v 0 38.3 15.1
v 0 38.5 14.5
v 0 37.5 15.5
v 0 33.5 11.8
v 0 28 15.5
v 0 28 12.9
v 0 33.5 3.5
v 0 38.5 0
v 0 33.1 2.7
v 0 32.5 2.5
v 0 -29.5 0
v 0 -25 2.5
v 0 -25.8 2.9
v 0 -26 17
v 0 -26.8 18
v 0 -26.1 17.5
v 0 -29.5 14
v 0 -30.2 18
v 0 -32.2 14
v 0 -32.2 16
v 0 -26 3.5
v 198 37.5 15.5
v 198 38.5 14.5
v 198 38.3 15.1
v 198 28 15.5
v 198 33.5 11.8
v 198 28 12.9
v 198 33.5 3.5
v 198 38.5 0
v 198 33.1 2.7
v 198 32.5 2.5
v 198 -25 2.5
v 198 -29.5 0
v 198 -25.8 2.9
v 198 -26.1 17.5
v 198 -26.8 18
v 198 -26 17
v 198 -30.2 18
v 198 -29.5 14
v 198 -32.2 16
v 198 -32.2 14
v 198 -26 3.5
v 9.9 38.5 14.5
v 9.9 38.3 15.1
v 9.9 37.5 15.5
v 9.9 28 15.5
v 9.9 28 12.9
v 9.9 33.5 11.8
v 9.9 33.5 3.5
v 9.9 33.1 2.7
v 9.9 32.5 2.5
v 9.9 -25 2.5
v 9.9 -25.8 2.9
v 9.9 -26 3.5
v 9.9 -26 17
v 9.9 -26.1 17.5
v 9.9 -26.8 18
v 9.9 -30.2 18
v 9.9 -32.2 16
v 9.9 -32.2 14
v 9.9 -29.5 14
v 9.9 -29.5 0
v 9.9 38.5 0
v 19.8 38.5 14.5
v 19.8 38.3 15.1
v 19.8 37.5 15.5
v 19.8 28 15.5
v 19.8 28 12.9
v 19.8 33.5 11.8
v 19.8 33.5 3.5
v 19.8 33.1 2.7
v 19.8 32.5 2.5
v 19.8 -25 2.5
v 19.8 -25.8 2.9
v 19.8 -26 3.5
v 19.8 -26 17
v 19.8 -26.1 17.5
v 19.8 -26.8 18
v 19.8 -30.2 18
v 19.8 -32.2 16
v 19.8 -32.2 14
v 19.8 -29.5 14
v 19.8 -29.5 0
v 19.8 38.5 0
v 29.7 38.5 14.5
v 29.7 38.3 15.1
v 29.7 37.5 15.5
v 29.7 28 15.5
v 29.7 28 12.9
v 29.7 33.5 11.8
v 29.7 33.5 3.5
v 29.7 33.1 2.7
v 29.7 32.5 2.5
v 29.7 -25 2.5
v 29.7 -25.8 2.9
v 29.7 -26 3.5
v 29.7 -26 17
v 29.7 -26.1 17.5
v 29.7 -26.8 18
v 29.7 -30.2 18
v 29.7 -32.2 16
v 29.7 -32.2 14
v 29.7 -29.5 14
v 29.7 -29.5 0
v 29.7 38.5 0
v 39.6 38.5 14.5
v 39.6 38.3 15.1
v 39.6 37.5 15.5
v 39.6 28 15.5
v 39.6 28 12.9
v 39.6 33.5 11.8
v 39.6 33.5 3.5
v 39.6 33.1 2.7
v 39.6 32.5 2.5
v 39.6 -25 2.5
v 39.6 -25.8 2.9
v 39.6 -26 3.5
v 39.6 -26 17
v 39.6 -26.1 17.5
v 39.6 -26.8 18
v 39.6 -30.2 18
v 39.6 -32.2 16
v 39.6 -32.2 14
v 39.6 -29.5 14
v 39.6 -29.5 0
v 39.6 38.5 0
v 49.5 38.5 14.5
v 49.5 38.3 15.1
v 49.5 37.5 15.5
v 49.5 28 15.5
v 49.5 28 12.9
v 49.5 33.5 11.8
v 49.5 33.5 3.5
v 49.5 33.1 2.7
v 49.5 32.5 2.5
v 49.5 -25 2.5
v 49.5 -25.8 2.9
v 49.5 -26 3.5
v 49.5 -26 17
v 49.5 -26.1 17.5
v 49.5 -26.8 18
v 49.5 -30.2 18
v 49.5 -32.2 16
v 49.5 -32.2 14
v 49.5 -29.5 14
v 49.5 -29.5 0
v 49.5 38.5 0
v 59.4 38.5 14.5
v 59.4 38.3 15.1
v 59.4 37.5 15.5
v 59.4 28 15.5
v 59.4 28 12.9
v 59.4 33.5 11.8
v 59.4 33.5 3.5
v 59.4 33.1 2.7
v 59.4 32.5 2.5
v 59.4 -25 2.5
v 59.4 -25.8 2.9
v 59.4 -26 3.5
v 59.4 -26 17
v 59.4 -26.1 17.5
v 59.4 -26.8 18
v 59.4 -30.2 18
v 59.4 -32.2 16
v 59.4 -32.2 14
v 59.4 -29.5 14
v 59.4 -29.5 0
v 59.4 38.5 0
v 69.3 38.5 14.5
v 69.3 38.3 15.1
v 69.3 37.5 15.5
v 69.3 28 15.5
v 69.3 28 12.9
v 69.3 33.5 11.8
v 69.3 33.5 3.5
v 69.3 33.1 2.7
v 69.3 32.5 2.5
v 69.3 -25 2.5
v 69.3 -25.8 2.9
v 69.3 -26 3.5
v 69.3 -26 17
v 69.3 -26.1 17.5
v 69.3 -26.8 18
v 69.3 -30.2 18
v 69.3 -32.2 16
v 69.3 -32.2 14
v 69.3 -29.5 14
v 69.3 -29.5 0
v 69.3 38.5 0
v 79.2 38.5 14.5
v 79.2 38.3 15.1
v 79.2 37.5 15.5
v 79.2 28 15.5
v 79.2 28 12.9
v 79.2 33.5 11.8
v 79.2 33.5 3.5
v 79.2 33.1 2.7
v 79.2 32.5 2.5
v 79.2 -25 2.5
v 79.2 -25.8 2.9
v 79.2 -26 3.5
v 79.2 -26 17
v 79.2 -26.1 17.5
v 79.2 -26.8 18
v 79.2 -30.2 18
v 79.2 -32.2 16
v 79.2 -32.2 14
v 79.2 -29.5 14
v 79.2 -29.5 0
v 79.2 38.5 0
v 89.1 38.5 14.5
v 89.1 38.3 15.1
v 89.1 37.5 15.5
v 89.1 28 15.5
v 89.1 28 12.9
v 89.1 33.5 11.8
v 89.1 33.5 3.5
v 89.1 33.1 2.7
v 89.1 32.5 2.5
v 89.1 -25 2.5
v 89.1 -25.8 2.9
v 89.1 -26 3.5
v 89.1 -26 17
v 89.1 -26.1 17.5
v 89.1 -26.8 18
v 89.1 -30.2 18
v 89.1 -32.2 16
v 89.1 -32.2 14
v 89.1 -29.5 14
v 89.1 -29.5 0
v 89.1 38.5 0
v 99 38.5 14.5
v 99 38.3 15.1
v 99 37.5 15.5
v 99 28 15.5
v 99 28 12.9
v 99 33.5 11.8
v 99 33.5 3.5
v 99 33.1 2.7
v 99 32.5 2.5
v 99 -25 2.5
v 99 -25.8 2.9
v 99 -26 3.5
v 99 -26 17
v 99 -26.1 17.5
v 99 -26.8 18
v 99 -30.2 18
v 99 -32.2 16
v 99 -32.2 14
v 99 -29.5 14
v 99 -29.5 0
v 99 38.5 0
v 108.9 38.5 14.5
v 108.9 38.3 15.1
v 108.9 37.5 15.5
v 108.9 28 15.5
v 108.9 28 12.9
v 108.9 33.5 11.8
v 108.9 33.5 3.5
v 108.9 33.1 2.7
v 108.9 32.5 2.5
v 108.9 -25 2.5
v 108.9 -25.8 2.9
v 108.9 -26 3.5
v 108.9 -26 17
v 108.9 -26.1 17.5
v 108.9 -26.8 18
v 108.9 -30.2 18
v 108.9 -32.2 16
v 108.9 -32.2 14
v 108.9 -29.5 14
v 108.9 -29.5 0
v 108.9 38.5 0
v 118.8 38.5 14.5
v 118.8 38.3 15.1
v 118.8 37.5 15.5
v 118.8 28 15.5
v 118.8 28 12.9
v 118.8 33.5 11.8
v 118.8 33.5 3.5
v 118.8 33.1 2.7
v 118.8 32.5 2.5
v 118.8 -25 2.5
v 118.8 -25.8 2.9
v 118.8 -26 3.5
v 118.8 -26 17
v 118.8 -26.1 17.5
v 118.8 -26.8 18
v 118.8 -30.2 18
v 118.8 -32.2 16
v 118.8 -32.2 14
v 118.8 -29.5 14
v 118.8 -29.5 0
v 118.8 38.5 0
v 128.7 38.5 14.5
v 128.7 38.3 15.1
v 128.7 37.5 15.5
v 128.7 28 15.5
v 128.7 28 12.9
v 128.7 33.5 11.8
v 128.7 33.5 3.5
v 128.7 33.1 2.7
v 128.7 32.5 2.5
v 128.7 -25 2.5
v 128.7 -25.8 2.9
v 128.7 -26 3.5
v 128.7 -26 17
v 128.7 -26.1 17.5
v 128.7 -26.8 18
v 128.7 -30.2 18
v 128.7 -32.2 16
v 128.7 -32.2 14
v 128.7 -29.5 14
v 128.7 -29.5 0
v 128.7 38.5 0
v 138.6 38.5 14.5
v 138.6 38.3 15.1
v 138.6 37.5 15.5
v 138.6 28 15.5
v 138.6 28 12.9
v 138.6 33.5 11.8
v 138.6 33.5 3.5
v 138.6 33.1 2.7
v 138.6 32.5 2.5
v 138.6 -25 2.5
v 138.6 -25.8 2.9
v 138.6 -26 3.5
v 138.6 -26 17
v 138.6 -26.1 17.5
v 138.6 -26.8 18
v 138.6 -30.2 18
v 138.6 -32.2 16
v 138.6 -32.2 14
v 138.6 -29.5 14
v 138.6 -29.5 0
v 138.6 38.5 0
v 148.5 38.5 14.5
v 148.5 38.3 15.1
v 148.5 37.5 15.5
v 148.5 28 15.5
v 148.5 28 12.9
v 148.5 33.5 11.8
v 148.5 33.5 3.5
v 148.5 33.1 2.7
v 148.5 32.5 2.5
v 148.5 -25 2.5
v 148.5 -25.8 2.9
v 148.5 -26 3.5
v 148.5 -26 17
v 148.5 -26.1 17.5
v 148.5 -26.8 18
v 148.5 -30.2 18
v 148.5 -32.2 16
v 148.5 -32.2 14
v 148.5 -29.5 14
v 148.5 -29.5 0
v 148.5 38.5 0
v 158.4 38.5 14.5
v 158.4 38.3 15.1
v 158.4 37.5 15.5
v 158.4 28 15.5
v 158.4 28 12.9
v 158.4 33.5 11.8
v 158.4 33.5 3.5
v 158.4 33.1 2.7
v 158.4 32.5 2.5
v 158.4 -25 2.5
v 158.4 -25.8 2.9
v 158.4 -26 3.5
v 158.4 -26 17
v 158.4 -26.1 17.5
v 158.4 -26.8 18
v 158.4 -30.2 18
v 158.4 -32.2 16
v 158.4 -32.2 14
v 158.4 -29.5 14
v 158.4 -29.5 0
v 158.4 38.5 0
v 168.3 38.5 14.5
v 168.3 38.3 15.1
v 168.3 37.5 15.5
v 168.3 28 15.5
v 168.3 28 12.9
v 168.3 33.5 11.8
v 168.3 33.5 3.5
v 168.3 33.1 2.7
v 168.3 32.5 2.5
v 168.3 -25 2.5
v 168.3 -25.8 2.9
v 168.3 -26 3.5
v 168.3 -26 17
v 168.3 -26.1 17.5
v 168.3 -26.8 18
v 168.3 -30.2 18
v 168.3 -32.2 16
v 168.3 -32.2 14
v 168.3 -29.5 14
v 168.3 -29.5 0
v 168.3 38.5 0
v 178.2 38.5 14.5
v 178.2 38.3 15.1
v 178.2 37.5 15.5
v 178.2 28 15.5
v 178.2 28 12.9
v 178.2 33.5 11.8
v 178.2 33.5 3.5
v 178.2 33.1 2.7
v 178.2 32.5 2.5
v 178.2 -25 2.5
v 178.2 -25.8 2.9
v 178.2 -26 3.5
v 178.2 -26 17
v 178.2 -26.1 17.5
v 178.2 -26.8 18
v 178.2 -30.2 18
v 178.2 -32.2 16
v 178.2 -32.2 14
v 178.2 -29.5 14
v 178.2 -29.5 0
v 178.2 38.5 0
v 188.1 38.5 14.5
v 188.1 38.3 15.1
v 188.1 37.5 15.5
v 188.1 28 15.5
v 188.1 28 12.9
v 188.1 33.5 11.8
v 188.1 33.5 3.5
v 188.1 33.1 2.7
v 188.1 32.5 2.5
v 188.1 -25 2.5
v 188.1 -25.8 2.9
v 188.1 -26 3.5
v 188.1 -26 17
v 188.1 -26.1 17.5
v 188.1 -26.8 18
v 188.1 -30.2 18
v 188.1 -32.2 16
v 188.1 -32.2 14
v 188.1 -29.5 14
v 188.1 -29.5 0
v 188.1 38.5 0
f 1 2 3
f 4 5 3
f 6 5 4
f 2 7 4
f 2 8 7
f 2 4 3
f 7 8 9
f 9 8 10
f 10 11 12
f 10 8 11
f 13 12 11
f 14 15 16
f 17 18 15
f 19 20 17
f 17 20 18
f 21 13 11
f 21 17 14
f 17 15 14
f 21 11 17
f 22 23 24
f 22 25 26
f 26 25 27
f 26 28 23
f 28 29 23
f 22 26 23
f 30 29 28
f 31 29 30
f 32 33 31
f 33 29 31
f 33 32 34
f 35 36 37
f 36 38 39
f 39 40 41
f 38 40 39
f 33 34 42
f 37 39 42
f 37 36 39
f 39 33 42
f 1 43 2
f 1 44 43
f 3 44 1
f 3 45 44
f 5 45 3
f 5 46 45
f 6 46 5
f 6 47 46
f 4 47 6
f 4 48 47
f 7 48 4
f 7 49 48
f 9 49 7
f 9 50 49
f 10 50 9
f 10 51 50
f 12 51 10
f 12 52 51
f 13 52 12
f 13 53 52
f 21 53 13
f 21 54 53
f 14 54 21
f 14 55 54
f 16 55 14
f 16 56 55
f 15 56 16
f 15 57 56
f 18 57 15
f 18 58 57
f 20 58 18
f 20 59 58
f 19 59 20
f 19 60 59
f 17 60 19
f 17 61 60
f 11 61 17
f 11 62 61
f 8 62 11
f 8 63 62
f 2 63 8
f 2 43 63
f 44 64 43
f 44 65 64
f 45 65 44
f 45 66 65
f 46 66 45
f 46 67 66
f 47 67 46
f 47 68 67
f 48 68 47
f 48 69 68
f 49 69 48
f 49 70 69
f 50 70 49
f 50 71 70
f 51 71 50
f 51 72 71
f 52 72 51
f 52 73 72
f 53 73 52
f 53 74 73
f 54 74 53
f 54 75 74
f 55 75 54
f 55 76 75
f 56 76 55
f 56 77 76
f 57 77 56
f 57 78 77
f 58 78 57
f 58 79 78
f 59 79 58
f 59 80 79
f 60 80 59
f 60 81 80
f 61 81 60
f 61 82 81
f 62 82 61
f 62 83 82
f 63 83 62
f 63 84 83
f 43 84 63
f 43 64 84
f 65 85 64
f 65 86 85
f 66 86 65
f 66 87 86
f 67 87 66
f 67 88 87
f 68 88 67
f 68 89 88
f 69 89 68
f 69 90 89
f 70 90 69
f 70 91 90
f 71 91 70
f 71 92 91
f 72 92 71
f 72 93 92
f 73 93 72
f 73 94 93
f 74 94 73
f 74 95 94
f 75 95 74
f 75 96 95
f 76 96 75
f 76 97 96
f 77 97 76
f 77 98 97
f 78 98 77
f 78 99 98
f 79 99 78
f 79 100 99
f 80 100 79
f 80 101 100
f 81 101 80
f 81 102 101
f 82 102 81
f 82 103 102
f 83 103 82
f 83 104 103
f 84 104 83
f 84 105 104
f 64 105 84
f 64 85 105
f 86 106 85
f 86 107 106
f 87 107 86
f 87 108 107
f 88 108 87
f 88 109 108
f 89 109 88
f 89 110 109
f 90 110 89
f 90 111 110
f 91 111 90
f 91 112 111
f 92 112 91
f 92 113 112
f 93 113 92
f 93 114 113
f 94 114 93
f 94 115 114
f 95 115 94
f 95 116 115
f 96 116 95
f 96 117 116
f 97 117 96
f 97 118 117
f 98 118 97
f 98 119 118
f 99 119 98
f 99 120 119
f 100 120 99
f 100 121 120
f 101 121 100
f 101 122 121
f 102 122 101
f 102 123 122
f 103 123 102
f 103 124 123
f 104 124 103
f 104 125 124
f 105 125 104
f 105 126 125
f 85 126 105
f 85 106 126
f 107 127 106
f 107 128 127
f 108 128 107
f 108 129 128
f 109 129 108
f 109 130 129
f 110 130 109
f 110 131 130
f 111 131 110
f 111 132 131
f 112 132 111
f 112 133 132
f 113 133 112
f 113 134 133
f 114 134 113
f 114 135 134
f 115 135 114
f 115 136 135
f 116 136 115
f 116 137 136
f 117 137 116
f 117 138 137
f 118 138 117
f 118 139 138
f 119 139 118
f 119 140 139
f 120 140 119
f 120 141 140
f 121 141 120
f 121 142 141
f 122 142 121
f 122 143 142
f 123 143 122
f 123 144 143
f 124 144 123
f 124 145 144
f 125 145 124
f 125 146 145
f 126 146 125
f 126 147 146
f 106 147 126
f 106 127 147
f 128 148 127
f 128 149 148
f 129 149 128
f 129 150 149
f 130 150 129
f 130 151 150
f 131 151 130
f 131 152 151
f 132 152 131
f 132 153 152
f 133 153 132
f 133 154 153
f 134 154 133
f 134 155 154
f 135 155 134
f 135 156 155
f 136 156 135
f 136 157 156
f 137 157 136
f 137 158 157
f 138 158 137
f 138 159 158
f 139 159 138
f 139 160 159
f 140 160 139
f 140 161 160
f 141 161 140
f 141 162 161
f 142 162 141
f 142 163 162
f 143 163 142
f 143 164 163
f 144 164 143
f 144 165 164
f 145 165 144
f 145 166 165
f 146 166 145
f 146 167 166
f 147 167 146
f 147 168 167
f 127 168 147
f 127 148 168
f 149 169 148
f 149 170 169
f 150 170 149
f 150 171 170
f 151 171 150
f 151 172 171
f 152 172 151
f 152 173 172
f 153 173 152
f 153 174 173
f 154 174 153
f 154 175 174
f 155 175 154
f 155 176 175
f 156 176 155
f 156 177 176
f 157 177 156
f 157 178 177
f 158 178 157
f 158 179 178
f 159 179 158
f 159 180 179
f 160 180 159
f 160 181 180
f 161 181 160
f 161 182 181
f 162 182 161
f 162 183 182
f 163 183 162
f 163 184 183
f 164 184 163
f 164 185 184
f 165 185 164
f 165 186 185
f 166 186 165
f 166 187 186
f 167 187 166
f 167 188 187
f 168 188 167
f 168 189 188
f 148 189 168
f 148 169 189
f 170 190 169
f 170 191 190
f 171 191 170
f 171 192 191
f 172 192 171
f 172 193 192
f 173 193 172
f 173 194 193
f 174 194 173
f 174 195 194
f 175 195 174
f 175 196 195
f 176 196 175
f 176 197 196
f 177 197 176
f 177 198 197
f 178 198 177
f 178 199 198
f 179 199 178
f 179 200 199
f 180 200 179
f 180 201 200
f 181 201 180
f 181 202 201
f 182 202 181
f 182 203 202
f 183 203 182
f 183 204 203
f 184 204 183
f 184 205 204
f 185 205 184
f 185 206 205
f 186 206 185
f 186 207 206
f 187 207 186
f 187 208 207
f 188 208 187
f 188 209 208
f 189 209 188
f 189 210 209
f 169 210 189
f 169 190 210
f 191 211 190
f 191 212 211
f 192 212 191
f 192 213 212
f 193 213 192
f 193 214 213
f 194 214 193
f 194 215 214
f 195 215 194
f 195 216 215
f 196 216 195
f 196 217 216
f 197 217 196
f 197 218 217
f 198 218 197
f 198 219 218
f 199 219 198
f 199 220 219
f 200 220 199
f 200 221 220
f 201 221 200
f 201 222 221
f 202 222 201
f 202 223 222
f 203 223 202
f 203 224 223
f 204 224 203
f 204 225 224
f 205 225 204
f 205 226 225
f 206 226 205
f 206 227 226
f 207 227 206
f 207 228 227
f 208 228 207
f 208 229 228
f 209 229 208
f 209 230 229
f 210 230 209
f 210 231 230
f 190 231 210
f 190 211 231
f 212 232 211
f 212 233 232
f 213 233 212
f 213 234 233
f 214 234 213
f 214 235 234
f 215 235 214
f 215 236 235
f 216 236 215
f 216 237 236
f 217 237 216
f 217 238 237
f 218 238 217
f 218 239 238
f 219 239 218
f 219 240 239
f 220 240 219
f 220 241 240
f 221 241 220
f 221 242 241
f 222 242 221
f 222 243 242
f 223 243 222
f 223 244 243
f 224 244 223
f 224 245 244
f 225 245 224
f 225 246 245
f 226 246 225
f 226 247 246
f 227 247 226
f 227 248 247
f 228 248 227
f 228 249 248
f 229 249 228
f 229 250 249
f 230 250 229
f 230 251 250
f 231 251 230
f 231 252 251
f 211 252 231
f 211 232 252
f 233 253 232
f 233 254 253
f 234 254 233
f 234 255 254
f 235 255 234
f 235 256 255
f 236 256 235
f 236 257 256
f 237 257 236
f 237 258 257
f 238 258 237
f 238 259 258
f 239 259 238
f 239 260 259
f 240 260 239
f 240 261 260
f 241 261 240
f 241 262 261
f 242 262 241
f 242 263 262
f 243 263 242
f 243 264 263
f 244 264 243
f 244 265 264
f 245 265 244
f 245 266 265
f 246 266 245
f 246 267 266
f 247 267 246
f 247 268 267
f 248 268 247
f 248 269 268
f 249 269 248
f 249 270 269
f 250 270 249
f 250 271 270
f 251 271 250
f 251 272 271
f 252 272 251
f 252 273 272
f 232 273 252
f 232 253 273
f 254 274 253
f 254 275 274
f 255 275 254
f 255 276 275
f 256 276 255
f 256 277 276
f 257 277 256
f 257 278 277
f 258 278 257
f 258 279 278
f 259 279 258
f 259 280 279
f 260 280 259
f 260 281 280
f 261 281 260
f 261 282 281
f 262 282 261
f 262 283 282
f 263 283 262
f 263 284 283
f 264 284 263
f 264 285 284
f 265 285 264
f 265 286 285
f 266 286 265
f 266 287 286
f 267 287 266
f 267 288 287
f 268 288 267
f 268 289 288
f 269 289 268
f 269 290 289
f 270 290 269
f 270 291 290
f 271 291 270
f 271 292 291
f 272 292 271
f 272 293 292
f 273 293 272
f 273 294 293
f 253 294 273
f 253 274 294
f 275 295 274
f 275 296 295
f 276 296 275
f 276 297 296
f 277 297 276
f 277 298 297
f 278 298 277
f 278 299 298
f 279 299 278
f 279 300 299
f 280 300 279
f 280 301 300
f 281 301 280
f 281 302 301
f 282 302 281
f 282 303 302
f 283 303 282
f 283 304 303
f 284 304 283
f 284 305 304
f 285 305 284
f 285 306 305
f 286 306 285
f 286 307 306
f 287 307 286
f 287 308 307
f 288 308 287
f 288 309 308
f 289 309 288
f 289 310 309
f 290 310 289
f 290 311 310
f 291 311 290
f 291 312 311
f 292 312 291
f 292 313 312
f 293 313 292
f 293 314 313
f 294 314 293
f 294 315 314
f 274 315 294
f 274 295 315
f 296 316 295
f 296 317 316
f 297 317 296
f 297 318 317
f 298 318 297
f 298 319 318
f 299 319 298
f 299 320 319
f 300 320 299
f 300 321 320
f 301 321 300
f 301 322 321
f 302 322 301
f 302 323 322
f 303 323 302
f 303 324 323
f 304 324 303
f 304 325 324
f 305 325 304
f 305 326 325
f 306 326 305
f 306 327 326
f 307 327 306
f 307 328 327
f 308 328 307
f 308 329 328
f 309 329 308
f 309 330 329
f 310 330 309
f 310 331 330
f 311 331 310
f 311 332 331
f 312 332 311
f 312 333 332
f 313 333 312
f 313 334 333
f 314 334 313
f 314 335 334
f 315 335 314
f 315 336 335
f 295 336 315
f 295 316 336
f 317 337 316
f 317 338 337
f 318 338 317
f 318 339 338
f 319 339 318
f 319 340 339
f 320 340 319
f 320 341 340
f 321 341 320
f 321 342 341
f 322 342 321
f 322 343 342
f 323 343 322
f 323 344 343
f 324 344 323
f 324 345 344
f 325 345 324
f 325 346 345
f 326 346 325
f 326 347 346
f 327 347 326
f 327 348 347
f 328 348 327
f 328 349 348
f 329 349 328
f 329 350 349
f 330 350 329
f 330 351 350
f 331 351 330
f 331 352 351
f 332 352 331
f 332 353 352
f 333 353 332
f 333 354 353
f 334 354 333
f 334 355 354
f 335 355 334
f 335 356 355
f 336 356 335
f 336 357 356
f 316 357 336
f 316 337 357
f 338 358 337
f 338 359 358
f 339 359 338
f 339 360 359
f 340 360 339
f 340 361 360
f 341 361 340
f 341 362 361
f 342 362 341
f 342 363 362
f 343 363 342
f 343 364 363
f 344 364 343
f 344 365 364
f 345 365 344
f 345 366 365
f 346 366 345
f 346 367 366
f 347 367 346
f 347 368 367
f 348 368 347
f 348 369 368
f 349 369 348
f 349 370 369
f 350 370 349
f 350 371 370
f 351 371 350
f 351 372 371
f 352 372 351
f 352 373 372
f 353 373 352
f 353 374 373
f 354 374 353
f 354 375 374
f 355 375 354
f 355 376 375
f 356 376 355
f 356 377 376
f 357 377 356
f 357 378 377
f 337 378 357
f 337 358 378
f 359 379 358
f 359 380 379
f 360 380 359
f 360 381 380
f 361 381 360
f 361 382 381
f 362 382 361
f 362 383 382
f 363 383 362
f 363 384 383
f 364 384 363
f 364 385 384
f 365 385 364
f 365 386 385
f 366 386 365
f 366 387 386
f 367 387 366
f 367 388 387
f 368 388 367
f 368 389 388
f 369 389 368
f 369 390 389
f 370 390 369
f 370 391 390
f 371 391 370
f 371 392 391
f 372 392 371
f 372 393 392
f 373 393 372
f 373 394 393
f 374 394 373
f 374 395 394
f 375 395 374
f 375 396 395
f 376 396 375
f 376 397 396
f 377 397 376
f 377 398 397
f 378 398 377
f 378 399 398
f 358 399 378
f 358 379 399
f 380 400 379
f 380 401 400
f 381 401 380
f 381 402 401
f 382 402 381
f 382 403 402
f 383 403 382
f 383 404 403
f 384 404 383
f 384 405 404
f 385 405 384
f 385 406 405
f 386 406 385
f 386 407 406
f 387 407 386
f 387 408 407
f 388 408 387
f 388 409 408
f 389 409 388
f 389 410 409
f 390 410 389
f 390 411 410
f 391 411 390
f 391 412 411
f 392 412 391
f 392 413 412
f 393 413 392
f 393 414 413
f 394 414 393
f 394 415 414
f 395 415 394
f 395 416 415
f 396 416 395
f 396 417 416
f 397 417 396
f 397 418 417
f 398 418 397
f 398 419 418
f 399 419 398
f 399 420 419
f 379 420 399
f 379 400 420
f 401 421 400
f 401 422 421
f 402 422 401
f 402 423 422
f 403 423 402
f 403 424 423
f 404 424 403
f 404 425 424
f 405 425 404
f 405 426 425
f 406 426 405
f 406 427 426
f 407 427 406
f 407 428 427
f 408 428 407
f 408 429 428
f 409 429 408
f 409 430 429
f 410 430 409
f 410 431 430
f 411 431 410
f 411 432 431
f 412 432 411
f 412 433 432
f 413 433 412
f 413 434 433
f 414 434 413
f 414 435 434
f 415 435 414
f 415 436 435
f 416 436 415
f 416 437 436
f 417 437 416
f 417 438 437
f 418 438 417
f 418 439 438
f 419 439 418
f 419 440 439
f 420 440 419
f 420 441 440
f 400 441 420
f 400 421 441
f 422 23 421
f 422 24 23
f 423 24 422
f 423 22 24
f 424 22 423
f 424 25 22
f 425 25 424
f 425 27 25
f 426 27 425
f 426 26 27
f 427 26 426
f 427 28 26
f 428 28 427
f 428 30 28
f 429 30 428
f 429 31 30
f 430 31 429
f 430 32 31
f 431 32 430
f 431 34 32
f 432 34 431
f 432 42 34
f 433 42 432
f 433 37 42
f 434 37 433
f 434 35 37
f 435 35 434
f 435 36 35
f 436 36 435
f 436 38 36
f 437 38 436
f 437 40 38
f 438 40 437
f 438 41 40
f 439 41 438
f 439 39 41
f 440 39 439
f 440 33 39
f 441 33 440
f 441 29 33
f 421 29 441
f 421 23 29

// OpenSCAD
module oldstl ()
{
  // rotate ([90,0,0]) import("files/SMD_Magazine_v1_-_15-1.5.stl", convexity=7);

  translate ([0,40,-30])rotate ([90,0,0])  import("Rail_60-5.stl", convexity=7);
}

//oldstl ();

module stencil() {
    
    polygon(points = [ [-29.5, 0], [-29.5,14], [-32.2,14], [-32.2, 16], [-30.2,18], 
                    [-26.8,18],  [-26.1,17.5],[-26.0,17.0],
                    [-26.0,3.5], [-25.8,2.9],[-25.0,2.5],
                    [32.5,2.5],
                    [33.1,2.7], [33.5,3.5],
                    [33.5,11.8],
                    [28,12.9],
                    [28,15.5],
                    [37.5,15.5],
                    [38.3,15.1],[38.5,14.5],
                    [38.5,0.0],
                    ]);
}

module rail(h=60) {
    rotate([90,0,90])
        linear_extrude(height = h, center = false, convexity = 10, slices = 20, scale = 1.0, $fn = 100) {
            stencil();
        }
}
rail(198);
